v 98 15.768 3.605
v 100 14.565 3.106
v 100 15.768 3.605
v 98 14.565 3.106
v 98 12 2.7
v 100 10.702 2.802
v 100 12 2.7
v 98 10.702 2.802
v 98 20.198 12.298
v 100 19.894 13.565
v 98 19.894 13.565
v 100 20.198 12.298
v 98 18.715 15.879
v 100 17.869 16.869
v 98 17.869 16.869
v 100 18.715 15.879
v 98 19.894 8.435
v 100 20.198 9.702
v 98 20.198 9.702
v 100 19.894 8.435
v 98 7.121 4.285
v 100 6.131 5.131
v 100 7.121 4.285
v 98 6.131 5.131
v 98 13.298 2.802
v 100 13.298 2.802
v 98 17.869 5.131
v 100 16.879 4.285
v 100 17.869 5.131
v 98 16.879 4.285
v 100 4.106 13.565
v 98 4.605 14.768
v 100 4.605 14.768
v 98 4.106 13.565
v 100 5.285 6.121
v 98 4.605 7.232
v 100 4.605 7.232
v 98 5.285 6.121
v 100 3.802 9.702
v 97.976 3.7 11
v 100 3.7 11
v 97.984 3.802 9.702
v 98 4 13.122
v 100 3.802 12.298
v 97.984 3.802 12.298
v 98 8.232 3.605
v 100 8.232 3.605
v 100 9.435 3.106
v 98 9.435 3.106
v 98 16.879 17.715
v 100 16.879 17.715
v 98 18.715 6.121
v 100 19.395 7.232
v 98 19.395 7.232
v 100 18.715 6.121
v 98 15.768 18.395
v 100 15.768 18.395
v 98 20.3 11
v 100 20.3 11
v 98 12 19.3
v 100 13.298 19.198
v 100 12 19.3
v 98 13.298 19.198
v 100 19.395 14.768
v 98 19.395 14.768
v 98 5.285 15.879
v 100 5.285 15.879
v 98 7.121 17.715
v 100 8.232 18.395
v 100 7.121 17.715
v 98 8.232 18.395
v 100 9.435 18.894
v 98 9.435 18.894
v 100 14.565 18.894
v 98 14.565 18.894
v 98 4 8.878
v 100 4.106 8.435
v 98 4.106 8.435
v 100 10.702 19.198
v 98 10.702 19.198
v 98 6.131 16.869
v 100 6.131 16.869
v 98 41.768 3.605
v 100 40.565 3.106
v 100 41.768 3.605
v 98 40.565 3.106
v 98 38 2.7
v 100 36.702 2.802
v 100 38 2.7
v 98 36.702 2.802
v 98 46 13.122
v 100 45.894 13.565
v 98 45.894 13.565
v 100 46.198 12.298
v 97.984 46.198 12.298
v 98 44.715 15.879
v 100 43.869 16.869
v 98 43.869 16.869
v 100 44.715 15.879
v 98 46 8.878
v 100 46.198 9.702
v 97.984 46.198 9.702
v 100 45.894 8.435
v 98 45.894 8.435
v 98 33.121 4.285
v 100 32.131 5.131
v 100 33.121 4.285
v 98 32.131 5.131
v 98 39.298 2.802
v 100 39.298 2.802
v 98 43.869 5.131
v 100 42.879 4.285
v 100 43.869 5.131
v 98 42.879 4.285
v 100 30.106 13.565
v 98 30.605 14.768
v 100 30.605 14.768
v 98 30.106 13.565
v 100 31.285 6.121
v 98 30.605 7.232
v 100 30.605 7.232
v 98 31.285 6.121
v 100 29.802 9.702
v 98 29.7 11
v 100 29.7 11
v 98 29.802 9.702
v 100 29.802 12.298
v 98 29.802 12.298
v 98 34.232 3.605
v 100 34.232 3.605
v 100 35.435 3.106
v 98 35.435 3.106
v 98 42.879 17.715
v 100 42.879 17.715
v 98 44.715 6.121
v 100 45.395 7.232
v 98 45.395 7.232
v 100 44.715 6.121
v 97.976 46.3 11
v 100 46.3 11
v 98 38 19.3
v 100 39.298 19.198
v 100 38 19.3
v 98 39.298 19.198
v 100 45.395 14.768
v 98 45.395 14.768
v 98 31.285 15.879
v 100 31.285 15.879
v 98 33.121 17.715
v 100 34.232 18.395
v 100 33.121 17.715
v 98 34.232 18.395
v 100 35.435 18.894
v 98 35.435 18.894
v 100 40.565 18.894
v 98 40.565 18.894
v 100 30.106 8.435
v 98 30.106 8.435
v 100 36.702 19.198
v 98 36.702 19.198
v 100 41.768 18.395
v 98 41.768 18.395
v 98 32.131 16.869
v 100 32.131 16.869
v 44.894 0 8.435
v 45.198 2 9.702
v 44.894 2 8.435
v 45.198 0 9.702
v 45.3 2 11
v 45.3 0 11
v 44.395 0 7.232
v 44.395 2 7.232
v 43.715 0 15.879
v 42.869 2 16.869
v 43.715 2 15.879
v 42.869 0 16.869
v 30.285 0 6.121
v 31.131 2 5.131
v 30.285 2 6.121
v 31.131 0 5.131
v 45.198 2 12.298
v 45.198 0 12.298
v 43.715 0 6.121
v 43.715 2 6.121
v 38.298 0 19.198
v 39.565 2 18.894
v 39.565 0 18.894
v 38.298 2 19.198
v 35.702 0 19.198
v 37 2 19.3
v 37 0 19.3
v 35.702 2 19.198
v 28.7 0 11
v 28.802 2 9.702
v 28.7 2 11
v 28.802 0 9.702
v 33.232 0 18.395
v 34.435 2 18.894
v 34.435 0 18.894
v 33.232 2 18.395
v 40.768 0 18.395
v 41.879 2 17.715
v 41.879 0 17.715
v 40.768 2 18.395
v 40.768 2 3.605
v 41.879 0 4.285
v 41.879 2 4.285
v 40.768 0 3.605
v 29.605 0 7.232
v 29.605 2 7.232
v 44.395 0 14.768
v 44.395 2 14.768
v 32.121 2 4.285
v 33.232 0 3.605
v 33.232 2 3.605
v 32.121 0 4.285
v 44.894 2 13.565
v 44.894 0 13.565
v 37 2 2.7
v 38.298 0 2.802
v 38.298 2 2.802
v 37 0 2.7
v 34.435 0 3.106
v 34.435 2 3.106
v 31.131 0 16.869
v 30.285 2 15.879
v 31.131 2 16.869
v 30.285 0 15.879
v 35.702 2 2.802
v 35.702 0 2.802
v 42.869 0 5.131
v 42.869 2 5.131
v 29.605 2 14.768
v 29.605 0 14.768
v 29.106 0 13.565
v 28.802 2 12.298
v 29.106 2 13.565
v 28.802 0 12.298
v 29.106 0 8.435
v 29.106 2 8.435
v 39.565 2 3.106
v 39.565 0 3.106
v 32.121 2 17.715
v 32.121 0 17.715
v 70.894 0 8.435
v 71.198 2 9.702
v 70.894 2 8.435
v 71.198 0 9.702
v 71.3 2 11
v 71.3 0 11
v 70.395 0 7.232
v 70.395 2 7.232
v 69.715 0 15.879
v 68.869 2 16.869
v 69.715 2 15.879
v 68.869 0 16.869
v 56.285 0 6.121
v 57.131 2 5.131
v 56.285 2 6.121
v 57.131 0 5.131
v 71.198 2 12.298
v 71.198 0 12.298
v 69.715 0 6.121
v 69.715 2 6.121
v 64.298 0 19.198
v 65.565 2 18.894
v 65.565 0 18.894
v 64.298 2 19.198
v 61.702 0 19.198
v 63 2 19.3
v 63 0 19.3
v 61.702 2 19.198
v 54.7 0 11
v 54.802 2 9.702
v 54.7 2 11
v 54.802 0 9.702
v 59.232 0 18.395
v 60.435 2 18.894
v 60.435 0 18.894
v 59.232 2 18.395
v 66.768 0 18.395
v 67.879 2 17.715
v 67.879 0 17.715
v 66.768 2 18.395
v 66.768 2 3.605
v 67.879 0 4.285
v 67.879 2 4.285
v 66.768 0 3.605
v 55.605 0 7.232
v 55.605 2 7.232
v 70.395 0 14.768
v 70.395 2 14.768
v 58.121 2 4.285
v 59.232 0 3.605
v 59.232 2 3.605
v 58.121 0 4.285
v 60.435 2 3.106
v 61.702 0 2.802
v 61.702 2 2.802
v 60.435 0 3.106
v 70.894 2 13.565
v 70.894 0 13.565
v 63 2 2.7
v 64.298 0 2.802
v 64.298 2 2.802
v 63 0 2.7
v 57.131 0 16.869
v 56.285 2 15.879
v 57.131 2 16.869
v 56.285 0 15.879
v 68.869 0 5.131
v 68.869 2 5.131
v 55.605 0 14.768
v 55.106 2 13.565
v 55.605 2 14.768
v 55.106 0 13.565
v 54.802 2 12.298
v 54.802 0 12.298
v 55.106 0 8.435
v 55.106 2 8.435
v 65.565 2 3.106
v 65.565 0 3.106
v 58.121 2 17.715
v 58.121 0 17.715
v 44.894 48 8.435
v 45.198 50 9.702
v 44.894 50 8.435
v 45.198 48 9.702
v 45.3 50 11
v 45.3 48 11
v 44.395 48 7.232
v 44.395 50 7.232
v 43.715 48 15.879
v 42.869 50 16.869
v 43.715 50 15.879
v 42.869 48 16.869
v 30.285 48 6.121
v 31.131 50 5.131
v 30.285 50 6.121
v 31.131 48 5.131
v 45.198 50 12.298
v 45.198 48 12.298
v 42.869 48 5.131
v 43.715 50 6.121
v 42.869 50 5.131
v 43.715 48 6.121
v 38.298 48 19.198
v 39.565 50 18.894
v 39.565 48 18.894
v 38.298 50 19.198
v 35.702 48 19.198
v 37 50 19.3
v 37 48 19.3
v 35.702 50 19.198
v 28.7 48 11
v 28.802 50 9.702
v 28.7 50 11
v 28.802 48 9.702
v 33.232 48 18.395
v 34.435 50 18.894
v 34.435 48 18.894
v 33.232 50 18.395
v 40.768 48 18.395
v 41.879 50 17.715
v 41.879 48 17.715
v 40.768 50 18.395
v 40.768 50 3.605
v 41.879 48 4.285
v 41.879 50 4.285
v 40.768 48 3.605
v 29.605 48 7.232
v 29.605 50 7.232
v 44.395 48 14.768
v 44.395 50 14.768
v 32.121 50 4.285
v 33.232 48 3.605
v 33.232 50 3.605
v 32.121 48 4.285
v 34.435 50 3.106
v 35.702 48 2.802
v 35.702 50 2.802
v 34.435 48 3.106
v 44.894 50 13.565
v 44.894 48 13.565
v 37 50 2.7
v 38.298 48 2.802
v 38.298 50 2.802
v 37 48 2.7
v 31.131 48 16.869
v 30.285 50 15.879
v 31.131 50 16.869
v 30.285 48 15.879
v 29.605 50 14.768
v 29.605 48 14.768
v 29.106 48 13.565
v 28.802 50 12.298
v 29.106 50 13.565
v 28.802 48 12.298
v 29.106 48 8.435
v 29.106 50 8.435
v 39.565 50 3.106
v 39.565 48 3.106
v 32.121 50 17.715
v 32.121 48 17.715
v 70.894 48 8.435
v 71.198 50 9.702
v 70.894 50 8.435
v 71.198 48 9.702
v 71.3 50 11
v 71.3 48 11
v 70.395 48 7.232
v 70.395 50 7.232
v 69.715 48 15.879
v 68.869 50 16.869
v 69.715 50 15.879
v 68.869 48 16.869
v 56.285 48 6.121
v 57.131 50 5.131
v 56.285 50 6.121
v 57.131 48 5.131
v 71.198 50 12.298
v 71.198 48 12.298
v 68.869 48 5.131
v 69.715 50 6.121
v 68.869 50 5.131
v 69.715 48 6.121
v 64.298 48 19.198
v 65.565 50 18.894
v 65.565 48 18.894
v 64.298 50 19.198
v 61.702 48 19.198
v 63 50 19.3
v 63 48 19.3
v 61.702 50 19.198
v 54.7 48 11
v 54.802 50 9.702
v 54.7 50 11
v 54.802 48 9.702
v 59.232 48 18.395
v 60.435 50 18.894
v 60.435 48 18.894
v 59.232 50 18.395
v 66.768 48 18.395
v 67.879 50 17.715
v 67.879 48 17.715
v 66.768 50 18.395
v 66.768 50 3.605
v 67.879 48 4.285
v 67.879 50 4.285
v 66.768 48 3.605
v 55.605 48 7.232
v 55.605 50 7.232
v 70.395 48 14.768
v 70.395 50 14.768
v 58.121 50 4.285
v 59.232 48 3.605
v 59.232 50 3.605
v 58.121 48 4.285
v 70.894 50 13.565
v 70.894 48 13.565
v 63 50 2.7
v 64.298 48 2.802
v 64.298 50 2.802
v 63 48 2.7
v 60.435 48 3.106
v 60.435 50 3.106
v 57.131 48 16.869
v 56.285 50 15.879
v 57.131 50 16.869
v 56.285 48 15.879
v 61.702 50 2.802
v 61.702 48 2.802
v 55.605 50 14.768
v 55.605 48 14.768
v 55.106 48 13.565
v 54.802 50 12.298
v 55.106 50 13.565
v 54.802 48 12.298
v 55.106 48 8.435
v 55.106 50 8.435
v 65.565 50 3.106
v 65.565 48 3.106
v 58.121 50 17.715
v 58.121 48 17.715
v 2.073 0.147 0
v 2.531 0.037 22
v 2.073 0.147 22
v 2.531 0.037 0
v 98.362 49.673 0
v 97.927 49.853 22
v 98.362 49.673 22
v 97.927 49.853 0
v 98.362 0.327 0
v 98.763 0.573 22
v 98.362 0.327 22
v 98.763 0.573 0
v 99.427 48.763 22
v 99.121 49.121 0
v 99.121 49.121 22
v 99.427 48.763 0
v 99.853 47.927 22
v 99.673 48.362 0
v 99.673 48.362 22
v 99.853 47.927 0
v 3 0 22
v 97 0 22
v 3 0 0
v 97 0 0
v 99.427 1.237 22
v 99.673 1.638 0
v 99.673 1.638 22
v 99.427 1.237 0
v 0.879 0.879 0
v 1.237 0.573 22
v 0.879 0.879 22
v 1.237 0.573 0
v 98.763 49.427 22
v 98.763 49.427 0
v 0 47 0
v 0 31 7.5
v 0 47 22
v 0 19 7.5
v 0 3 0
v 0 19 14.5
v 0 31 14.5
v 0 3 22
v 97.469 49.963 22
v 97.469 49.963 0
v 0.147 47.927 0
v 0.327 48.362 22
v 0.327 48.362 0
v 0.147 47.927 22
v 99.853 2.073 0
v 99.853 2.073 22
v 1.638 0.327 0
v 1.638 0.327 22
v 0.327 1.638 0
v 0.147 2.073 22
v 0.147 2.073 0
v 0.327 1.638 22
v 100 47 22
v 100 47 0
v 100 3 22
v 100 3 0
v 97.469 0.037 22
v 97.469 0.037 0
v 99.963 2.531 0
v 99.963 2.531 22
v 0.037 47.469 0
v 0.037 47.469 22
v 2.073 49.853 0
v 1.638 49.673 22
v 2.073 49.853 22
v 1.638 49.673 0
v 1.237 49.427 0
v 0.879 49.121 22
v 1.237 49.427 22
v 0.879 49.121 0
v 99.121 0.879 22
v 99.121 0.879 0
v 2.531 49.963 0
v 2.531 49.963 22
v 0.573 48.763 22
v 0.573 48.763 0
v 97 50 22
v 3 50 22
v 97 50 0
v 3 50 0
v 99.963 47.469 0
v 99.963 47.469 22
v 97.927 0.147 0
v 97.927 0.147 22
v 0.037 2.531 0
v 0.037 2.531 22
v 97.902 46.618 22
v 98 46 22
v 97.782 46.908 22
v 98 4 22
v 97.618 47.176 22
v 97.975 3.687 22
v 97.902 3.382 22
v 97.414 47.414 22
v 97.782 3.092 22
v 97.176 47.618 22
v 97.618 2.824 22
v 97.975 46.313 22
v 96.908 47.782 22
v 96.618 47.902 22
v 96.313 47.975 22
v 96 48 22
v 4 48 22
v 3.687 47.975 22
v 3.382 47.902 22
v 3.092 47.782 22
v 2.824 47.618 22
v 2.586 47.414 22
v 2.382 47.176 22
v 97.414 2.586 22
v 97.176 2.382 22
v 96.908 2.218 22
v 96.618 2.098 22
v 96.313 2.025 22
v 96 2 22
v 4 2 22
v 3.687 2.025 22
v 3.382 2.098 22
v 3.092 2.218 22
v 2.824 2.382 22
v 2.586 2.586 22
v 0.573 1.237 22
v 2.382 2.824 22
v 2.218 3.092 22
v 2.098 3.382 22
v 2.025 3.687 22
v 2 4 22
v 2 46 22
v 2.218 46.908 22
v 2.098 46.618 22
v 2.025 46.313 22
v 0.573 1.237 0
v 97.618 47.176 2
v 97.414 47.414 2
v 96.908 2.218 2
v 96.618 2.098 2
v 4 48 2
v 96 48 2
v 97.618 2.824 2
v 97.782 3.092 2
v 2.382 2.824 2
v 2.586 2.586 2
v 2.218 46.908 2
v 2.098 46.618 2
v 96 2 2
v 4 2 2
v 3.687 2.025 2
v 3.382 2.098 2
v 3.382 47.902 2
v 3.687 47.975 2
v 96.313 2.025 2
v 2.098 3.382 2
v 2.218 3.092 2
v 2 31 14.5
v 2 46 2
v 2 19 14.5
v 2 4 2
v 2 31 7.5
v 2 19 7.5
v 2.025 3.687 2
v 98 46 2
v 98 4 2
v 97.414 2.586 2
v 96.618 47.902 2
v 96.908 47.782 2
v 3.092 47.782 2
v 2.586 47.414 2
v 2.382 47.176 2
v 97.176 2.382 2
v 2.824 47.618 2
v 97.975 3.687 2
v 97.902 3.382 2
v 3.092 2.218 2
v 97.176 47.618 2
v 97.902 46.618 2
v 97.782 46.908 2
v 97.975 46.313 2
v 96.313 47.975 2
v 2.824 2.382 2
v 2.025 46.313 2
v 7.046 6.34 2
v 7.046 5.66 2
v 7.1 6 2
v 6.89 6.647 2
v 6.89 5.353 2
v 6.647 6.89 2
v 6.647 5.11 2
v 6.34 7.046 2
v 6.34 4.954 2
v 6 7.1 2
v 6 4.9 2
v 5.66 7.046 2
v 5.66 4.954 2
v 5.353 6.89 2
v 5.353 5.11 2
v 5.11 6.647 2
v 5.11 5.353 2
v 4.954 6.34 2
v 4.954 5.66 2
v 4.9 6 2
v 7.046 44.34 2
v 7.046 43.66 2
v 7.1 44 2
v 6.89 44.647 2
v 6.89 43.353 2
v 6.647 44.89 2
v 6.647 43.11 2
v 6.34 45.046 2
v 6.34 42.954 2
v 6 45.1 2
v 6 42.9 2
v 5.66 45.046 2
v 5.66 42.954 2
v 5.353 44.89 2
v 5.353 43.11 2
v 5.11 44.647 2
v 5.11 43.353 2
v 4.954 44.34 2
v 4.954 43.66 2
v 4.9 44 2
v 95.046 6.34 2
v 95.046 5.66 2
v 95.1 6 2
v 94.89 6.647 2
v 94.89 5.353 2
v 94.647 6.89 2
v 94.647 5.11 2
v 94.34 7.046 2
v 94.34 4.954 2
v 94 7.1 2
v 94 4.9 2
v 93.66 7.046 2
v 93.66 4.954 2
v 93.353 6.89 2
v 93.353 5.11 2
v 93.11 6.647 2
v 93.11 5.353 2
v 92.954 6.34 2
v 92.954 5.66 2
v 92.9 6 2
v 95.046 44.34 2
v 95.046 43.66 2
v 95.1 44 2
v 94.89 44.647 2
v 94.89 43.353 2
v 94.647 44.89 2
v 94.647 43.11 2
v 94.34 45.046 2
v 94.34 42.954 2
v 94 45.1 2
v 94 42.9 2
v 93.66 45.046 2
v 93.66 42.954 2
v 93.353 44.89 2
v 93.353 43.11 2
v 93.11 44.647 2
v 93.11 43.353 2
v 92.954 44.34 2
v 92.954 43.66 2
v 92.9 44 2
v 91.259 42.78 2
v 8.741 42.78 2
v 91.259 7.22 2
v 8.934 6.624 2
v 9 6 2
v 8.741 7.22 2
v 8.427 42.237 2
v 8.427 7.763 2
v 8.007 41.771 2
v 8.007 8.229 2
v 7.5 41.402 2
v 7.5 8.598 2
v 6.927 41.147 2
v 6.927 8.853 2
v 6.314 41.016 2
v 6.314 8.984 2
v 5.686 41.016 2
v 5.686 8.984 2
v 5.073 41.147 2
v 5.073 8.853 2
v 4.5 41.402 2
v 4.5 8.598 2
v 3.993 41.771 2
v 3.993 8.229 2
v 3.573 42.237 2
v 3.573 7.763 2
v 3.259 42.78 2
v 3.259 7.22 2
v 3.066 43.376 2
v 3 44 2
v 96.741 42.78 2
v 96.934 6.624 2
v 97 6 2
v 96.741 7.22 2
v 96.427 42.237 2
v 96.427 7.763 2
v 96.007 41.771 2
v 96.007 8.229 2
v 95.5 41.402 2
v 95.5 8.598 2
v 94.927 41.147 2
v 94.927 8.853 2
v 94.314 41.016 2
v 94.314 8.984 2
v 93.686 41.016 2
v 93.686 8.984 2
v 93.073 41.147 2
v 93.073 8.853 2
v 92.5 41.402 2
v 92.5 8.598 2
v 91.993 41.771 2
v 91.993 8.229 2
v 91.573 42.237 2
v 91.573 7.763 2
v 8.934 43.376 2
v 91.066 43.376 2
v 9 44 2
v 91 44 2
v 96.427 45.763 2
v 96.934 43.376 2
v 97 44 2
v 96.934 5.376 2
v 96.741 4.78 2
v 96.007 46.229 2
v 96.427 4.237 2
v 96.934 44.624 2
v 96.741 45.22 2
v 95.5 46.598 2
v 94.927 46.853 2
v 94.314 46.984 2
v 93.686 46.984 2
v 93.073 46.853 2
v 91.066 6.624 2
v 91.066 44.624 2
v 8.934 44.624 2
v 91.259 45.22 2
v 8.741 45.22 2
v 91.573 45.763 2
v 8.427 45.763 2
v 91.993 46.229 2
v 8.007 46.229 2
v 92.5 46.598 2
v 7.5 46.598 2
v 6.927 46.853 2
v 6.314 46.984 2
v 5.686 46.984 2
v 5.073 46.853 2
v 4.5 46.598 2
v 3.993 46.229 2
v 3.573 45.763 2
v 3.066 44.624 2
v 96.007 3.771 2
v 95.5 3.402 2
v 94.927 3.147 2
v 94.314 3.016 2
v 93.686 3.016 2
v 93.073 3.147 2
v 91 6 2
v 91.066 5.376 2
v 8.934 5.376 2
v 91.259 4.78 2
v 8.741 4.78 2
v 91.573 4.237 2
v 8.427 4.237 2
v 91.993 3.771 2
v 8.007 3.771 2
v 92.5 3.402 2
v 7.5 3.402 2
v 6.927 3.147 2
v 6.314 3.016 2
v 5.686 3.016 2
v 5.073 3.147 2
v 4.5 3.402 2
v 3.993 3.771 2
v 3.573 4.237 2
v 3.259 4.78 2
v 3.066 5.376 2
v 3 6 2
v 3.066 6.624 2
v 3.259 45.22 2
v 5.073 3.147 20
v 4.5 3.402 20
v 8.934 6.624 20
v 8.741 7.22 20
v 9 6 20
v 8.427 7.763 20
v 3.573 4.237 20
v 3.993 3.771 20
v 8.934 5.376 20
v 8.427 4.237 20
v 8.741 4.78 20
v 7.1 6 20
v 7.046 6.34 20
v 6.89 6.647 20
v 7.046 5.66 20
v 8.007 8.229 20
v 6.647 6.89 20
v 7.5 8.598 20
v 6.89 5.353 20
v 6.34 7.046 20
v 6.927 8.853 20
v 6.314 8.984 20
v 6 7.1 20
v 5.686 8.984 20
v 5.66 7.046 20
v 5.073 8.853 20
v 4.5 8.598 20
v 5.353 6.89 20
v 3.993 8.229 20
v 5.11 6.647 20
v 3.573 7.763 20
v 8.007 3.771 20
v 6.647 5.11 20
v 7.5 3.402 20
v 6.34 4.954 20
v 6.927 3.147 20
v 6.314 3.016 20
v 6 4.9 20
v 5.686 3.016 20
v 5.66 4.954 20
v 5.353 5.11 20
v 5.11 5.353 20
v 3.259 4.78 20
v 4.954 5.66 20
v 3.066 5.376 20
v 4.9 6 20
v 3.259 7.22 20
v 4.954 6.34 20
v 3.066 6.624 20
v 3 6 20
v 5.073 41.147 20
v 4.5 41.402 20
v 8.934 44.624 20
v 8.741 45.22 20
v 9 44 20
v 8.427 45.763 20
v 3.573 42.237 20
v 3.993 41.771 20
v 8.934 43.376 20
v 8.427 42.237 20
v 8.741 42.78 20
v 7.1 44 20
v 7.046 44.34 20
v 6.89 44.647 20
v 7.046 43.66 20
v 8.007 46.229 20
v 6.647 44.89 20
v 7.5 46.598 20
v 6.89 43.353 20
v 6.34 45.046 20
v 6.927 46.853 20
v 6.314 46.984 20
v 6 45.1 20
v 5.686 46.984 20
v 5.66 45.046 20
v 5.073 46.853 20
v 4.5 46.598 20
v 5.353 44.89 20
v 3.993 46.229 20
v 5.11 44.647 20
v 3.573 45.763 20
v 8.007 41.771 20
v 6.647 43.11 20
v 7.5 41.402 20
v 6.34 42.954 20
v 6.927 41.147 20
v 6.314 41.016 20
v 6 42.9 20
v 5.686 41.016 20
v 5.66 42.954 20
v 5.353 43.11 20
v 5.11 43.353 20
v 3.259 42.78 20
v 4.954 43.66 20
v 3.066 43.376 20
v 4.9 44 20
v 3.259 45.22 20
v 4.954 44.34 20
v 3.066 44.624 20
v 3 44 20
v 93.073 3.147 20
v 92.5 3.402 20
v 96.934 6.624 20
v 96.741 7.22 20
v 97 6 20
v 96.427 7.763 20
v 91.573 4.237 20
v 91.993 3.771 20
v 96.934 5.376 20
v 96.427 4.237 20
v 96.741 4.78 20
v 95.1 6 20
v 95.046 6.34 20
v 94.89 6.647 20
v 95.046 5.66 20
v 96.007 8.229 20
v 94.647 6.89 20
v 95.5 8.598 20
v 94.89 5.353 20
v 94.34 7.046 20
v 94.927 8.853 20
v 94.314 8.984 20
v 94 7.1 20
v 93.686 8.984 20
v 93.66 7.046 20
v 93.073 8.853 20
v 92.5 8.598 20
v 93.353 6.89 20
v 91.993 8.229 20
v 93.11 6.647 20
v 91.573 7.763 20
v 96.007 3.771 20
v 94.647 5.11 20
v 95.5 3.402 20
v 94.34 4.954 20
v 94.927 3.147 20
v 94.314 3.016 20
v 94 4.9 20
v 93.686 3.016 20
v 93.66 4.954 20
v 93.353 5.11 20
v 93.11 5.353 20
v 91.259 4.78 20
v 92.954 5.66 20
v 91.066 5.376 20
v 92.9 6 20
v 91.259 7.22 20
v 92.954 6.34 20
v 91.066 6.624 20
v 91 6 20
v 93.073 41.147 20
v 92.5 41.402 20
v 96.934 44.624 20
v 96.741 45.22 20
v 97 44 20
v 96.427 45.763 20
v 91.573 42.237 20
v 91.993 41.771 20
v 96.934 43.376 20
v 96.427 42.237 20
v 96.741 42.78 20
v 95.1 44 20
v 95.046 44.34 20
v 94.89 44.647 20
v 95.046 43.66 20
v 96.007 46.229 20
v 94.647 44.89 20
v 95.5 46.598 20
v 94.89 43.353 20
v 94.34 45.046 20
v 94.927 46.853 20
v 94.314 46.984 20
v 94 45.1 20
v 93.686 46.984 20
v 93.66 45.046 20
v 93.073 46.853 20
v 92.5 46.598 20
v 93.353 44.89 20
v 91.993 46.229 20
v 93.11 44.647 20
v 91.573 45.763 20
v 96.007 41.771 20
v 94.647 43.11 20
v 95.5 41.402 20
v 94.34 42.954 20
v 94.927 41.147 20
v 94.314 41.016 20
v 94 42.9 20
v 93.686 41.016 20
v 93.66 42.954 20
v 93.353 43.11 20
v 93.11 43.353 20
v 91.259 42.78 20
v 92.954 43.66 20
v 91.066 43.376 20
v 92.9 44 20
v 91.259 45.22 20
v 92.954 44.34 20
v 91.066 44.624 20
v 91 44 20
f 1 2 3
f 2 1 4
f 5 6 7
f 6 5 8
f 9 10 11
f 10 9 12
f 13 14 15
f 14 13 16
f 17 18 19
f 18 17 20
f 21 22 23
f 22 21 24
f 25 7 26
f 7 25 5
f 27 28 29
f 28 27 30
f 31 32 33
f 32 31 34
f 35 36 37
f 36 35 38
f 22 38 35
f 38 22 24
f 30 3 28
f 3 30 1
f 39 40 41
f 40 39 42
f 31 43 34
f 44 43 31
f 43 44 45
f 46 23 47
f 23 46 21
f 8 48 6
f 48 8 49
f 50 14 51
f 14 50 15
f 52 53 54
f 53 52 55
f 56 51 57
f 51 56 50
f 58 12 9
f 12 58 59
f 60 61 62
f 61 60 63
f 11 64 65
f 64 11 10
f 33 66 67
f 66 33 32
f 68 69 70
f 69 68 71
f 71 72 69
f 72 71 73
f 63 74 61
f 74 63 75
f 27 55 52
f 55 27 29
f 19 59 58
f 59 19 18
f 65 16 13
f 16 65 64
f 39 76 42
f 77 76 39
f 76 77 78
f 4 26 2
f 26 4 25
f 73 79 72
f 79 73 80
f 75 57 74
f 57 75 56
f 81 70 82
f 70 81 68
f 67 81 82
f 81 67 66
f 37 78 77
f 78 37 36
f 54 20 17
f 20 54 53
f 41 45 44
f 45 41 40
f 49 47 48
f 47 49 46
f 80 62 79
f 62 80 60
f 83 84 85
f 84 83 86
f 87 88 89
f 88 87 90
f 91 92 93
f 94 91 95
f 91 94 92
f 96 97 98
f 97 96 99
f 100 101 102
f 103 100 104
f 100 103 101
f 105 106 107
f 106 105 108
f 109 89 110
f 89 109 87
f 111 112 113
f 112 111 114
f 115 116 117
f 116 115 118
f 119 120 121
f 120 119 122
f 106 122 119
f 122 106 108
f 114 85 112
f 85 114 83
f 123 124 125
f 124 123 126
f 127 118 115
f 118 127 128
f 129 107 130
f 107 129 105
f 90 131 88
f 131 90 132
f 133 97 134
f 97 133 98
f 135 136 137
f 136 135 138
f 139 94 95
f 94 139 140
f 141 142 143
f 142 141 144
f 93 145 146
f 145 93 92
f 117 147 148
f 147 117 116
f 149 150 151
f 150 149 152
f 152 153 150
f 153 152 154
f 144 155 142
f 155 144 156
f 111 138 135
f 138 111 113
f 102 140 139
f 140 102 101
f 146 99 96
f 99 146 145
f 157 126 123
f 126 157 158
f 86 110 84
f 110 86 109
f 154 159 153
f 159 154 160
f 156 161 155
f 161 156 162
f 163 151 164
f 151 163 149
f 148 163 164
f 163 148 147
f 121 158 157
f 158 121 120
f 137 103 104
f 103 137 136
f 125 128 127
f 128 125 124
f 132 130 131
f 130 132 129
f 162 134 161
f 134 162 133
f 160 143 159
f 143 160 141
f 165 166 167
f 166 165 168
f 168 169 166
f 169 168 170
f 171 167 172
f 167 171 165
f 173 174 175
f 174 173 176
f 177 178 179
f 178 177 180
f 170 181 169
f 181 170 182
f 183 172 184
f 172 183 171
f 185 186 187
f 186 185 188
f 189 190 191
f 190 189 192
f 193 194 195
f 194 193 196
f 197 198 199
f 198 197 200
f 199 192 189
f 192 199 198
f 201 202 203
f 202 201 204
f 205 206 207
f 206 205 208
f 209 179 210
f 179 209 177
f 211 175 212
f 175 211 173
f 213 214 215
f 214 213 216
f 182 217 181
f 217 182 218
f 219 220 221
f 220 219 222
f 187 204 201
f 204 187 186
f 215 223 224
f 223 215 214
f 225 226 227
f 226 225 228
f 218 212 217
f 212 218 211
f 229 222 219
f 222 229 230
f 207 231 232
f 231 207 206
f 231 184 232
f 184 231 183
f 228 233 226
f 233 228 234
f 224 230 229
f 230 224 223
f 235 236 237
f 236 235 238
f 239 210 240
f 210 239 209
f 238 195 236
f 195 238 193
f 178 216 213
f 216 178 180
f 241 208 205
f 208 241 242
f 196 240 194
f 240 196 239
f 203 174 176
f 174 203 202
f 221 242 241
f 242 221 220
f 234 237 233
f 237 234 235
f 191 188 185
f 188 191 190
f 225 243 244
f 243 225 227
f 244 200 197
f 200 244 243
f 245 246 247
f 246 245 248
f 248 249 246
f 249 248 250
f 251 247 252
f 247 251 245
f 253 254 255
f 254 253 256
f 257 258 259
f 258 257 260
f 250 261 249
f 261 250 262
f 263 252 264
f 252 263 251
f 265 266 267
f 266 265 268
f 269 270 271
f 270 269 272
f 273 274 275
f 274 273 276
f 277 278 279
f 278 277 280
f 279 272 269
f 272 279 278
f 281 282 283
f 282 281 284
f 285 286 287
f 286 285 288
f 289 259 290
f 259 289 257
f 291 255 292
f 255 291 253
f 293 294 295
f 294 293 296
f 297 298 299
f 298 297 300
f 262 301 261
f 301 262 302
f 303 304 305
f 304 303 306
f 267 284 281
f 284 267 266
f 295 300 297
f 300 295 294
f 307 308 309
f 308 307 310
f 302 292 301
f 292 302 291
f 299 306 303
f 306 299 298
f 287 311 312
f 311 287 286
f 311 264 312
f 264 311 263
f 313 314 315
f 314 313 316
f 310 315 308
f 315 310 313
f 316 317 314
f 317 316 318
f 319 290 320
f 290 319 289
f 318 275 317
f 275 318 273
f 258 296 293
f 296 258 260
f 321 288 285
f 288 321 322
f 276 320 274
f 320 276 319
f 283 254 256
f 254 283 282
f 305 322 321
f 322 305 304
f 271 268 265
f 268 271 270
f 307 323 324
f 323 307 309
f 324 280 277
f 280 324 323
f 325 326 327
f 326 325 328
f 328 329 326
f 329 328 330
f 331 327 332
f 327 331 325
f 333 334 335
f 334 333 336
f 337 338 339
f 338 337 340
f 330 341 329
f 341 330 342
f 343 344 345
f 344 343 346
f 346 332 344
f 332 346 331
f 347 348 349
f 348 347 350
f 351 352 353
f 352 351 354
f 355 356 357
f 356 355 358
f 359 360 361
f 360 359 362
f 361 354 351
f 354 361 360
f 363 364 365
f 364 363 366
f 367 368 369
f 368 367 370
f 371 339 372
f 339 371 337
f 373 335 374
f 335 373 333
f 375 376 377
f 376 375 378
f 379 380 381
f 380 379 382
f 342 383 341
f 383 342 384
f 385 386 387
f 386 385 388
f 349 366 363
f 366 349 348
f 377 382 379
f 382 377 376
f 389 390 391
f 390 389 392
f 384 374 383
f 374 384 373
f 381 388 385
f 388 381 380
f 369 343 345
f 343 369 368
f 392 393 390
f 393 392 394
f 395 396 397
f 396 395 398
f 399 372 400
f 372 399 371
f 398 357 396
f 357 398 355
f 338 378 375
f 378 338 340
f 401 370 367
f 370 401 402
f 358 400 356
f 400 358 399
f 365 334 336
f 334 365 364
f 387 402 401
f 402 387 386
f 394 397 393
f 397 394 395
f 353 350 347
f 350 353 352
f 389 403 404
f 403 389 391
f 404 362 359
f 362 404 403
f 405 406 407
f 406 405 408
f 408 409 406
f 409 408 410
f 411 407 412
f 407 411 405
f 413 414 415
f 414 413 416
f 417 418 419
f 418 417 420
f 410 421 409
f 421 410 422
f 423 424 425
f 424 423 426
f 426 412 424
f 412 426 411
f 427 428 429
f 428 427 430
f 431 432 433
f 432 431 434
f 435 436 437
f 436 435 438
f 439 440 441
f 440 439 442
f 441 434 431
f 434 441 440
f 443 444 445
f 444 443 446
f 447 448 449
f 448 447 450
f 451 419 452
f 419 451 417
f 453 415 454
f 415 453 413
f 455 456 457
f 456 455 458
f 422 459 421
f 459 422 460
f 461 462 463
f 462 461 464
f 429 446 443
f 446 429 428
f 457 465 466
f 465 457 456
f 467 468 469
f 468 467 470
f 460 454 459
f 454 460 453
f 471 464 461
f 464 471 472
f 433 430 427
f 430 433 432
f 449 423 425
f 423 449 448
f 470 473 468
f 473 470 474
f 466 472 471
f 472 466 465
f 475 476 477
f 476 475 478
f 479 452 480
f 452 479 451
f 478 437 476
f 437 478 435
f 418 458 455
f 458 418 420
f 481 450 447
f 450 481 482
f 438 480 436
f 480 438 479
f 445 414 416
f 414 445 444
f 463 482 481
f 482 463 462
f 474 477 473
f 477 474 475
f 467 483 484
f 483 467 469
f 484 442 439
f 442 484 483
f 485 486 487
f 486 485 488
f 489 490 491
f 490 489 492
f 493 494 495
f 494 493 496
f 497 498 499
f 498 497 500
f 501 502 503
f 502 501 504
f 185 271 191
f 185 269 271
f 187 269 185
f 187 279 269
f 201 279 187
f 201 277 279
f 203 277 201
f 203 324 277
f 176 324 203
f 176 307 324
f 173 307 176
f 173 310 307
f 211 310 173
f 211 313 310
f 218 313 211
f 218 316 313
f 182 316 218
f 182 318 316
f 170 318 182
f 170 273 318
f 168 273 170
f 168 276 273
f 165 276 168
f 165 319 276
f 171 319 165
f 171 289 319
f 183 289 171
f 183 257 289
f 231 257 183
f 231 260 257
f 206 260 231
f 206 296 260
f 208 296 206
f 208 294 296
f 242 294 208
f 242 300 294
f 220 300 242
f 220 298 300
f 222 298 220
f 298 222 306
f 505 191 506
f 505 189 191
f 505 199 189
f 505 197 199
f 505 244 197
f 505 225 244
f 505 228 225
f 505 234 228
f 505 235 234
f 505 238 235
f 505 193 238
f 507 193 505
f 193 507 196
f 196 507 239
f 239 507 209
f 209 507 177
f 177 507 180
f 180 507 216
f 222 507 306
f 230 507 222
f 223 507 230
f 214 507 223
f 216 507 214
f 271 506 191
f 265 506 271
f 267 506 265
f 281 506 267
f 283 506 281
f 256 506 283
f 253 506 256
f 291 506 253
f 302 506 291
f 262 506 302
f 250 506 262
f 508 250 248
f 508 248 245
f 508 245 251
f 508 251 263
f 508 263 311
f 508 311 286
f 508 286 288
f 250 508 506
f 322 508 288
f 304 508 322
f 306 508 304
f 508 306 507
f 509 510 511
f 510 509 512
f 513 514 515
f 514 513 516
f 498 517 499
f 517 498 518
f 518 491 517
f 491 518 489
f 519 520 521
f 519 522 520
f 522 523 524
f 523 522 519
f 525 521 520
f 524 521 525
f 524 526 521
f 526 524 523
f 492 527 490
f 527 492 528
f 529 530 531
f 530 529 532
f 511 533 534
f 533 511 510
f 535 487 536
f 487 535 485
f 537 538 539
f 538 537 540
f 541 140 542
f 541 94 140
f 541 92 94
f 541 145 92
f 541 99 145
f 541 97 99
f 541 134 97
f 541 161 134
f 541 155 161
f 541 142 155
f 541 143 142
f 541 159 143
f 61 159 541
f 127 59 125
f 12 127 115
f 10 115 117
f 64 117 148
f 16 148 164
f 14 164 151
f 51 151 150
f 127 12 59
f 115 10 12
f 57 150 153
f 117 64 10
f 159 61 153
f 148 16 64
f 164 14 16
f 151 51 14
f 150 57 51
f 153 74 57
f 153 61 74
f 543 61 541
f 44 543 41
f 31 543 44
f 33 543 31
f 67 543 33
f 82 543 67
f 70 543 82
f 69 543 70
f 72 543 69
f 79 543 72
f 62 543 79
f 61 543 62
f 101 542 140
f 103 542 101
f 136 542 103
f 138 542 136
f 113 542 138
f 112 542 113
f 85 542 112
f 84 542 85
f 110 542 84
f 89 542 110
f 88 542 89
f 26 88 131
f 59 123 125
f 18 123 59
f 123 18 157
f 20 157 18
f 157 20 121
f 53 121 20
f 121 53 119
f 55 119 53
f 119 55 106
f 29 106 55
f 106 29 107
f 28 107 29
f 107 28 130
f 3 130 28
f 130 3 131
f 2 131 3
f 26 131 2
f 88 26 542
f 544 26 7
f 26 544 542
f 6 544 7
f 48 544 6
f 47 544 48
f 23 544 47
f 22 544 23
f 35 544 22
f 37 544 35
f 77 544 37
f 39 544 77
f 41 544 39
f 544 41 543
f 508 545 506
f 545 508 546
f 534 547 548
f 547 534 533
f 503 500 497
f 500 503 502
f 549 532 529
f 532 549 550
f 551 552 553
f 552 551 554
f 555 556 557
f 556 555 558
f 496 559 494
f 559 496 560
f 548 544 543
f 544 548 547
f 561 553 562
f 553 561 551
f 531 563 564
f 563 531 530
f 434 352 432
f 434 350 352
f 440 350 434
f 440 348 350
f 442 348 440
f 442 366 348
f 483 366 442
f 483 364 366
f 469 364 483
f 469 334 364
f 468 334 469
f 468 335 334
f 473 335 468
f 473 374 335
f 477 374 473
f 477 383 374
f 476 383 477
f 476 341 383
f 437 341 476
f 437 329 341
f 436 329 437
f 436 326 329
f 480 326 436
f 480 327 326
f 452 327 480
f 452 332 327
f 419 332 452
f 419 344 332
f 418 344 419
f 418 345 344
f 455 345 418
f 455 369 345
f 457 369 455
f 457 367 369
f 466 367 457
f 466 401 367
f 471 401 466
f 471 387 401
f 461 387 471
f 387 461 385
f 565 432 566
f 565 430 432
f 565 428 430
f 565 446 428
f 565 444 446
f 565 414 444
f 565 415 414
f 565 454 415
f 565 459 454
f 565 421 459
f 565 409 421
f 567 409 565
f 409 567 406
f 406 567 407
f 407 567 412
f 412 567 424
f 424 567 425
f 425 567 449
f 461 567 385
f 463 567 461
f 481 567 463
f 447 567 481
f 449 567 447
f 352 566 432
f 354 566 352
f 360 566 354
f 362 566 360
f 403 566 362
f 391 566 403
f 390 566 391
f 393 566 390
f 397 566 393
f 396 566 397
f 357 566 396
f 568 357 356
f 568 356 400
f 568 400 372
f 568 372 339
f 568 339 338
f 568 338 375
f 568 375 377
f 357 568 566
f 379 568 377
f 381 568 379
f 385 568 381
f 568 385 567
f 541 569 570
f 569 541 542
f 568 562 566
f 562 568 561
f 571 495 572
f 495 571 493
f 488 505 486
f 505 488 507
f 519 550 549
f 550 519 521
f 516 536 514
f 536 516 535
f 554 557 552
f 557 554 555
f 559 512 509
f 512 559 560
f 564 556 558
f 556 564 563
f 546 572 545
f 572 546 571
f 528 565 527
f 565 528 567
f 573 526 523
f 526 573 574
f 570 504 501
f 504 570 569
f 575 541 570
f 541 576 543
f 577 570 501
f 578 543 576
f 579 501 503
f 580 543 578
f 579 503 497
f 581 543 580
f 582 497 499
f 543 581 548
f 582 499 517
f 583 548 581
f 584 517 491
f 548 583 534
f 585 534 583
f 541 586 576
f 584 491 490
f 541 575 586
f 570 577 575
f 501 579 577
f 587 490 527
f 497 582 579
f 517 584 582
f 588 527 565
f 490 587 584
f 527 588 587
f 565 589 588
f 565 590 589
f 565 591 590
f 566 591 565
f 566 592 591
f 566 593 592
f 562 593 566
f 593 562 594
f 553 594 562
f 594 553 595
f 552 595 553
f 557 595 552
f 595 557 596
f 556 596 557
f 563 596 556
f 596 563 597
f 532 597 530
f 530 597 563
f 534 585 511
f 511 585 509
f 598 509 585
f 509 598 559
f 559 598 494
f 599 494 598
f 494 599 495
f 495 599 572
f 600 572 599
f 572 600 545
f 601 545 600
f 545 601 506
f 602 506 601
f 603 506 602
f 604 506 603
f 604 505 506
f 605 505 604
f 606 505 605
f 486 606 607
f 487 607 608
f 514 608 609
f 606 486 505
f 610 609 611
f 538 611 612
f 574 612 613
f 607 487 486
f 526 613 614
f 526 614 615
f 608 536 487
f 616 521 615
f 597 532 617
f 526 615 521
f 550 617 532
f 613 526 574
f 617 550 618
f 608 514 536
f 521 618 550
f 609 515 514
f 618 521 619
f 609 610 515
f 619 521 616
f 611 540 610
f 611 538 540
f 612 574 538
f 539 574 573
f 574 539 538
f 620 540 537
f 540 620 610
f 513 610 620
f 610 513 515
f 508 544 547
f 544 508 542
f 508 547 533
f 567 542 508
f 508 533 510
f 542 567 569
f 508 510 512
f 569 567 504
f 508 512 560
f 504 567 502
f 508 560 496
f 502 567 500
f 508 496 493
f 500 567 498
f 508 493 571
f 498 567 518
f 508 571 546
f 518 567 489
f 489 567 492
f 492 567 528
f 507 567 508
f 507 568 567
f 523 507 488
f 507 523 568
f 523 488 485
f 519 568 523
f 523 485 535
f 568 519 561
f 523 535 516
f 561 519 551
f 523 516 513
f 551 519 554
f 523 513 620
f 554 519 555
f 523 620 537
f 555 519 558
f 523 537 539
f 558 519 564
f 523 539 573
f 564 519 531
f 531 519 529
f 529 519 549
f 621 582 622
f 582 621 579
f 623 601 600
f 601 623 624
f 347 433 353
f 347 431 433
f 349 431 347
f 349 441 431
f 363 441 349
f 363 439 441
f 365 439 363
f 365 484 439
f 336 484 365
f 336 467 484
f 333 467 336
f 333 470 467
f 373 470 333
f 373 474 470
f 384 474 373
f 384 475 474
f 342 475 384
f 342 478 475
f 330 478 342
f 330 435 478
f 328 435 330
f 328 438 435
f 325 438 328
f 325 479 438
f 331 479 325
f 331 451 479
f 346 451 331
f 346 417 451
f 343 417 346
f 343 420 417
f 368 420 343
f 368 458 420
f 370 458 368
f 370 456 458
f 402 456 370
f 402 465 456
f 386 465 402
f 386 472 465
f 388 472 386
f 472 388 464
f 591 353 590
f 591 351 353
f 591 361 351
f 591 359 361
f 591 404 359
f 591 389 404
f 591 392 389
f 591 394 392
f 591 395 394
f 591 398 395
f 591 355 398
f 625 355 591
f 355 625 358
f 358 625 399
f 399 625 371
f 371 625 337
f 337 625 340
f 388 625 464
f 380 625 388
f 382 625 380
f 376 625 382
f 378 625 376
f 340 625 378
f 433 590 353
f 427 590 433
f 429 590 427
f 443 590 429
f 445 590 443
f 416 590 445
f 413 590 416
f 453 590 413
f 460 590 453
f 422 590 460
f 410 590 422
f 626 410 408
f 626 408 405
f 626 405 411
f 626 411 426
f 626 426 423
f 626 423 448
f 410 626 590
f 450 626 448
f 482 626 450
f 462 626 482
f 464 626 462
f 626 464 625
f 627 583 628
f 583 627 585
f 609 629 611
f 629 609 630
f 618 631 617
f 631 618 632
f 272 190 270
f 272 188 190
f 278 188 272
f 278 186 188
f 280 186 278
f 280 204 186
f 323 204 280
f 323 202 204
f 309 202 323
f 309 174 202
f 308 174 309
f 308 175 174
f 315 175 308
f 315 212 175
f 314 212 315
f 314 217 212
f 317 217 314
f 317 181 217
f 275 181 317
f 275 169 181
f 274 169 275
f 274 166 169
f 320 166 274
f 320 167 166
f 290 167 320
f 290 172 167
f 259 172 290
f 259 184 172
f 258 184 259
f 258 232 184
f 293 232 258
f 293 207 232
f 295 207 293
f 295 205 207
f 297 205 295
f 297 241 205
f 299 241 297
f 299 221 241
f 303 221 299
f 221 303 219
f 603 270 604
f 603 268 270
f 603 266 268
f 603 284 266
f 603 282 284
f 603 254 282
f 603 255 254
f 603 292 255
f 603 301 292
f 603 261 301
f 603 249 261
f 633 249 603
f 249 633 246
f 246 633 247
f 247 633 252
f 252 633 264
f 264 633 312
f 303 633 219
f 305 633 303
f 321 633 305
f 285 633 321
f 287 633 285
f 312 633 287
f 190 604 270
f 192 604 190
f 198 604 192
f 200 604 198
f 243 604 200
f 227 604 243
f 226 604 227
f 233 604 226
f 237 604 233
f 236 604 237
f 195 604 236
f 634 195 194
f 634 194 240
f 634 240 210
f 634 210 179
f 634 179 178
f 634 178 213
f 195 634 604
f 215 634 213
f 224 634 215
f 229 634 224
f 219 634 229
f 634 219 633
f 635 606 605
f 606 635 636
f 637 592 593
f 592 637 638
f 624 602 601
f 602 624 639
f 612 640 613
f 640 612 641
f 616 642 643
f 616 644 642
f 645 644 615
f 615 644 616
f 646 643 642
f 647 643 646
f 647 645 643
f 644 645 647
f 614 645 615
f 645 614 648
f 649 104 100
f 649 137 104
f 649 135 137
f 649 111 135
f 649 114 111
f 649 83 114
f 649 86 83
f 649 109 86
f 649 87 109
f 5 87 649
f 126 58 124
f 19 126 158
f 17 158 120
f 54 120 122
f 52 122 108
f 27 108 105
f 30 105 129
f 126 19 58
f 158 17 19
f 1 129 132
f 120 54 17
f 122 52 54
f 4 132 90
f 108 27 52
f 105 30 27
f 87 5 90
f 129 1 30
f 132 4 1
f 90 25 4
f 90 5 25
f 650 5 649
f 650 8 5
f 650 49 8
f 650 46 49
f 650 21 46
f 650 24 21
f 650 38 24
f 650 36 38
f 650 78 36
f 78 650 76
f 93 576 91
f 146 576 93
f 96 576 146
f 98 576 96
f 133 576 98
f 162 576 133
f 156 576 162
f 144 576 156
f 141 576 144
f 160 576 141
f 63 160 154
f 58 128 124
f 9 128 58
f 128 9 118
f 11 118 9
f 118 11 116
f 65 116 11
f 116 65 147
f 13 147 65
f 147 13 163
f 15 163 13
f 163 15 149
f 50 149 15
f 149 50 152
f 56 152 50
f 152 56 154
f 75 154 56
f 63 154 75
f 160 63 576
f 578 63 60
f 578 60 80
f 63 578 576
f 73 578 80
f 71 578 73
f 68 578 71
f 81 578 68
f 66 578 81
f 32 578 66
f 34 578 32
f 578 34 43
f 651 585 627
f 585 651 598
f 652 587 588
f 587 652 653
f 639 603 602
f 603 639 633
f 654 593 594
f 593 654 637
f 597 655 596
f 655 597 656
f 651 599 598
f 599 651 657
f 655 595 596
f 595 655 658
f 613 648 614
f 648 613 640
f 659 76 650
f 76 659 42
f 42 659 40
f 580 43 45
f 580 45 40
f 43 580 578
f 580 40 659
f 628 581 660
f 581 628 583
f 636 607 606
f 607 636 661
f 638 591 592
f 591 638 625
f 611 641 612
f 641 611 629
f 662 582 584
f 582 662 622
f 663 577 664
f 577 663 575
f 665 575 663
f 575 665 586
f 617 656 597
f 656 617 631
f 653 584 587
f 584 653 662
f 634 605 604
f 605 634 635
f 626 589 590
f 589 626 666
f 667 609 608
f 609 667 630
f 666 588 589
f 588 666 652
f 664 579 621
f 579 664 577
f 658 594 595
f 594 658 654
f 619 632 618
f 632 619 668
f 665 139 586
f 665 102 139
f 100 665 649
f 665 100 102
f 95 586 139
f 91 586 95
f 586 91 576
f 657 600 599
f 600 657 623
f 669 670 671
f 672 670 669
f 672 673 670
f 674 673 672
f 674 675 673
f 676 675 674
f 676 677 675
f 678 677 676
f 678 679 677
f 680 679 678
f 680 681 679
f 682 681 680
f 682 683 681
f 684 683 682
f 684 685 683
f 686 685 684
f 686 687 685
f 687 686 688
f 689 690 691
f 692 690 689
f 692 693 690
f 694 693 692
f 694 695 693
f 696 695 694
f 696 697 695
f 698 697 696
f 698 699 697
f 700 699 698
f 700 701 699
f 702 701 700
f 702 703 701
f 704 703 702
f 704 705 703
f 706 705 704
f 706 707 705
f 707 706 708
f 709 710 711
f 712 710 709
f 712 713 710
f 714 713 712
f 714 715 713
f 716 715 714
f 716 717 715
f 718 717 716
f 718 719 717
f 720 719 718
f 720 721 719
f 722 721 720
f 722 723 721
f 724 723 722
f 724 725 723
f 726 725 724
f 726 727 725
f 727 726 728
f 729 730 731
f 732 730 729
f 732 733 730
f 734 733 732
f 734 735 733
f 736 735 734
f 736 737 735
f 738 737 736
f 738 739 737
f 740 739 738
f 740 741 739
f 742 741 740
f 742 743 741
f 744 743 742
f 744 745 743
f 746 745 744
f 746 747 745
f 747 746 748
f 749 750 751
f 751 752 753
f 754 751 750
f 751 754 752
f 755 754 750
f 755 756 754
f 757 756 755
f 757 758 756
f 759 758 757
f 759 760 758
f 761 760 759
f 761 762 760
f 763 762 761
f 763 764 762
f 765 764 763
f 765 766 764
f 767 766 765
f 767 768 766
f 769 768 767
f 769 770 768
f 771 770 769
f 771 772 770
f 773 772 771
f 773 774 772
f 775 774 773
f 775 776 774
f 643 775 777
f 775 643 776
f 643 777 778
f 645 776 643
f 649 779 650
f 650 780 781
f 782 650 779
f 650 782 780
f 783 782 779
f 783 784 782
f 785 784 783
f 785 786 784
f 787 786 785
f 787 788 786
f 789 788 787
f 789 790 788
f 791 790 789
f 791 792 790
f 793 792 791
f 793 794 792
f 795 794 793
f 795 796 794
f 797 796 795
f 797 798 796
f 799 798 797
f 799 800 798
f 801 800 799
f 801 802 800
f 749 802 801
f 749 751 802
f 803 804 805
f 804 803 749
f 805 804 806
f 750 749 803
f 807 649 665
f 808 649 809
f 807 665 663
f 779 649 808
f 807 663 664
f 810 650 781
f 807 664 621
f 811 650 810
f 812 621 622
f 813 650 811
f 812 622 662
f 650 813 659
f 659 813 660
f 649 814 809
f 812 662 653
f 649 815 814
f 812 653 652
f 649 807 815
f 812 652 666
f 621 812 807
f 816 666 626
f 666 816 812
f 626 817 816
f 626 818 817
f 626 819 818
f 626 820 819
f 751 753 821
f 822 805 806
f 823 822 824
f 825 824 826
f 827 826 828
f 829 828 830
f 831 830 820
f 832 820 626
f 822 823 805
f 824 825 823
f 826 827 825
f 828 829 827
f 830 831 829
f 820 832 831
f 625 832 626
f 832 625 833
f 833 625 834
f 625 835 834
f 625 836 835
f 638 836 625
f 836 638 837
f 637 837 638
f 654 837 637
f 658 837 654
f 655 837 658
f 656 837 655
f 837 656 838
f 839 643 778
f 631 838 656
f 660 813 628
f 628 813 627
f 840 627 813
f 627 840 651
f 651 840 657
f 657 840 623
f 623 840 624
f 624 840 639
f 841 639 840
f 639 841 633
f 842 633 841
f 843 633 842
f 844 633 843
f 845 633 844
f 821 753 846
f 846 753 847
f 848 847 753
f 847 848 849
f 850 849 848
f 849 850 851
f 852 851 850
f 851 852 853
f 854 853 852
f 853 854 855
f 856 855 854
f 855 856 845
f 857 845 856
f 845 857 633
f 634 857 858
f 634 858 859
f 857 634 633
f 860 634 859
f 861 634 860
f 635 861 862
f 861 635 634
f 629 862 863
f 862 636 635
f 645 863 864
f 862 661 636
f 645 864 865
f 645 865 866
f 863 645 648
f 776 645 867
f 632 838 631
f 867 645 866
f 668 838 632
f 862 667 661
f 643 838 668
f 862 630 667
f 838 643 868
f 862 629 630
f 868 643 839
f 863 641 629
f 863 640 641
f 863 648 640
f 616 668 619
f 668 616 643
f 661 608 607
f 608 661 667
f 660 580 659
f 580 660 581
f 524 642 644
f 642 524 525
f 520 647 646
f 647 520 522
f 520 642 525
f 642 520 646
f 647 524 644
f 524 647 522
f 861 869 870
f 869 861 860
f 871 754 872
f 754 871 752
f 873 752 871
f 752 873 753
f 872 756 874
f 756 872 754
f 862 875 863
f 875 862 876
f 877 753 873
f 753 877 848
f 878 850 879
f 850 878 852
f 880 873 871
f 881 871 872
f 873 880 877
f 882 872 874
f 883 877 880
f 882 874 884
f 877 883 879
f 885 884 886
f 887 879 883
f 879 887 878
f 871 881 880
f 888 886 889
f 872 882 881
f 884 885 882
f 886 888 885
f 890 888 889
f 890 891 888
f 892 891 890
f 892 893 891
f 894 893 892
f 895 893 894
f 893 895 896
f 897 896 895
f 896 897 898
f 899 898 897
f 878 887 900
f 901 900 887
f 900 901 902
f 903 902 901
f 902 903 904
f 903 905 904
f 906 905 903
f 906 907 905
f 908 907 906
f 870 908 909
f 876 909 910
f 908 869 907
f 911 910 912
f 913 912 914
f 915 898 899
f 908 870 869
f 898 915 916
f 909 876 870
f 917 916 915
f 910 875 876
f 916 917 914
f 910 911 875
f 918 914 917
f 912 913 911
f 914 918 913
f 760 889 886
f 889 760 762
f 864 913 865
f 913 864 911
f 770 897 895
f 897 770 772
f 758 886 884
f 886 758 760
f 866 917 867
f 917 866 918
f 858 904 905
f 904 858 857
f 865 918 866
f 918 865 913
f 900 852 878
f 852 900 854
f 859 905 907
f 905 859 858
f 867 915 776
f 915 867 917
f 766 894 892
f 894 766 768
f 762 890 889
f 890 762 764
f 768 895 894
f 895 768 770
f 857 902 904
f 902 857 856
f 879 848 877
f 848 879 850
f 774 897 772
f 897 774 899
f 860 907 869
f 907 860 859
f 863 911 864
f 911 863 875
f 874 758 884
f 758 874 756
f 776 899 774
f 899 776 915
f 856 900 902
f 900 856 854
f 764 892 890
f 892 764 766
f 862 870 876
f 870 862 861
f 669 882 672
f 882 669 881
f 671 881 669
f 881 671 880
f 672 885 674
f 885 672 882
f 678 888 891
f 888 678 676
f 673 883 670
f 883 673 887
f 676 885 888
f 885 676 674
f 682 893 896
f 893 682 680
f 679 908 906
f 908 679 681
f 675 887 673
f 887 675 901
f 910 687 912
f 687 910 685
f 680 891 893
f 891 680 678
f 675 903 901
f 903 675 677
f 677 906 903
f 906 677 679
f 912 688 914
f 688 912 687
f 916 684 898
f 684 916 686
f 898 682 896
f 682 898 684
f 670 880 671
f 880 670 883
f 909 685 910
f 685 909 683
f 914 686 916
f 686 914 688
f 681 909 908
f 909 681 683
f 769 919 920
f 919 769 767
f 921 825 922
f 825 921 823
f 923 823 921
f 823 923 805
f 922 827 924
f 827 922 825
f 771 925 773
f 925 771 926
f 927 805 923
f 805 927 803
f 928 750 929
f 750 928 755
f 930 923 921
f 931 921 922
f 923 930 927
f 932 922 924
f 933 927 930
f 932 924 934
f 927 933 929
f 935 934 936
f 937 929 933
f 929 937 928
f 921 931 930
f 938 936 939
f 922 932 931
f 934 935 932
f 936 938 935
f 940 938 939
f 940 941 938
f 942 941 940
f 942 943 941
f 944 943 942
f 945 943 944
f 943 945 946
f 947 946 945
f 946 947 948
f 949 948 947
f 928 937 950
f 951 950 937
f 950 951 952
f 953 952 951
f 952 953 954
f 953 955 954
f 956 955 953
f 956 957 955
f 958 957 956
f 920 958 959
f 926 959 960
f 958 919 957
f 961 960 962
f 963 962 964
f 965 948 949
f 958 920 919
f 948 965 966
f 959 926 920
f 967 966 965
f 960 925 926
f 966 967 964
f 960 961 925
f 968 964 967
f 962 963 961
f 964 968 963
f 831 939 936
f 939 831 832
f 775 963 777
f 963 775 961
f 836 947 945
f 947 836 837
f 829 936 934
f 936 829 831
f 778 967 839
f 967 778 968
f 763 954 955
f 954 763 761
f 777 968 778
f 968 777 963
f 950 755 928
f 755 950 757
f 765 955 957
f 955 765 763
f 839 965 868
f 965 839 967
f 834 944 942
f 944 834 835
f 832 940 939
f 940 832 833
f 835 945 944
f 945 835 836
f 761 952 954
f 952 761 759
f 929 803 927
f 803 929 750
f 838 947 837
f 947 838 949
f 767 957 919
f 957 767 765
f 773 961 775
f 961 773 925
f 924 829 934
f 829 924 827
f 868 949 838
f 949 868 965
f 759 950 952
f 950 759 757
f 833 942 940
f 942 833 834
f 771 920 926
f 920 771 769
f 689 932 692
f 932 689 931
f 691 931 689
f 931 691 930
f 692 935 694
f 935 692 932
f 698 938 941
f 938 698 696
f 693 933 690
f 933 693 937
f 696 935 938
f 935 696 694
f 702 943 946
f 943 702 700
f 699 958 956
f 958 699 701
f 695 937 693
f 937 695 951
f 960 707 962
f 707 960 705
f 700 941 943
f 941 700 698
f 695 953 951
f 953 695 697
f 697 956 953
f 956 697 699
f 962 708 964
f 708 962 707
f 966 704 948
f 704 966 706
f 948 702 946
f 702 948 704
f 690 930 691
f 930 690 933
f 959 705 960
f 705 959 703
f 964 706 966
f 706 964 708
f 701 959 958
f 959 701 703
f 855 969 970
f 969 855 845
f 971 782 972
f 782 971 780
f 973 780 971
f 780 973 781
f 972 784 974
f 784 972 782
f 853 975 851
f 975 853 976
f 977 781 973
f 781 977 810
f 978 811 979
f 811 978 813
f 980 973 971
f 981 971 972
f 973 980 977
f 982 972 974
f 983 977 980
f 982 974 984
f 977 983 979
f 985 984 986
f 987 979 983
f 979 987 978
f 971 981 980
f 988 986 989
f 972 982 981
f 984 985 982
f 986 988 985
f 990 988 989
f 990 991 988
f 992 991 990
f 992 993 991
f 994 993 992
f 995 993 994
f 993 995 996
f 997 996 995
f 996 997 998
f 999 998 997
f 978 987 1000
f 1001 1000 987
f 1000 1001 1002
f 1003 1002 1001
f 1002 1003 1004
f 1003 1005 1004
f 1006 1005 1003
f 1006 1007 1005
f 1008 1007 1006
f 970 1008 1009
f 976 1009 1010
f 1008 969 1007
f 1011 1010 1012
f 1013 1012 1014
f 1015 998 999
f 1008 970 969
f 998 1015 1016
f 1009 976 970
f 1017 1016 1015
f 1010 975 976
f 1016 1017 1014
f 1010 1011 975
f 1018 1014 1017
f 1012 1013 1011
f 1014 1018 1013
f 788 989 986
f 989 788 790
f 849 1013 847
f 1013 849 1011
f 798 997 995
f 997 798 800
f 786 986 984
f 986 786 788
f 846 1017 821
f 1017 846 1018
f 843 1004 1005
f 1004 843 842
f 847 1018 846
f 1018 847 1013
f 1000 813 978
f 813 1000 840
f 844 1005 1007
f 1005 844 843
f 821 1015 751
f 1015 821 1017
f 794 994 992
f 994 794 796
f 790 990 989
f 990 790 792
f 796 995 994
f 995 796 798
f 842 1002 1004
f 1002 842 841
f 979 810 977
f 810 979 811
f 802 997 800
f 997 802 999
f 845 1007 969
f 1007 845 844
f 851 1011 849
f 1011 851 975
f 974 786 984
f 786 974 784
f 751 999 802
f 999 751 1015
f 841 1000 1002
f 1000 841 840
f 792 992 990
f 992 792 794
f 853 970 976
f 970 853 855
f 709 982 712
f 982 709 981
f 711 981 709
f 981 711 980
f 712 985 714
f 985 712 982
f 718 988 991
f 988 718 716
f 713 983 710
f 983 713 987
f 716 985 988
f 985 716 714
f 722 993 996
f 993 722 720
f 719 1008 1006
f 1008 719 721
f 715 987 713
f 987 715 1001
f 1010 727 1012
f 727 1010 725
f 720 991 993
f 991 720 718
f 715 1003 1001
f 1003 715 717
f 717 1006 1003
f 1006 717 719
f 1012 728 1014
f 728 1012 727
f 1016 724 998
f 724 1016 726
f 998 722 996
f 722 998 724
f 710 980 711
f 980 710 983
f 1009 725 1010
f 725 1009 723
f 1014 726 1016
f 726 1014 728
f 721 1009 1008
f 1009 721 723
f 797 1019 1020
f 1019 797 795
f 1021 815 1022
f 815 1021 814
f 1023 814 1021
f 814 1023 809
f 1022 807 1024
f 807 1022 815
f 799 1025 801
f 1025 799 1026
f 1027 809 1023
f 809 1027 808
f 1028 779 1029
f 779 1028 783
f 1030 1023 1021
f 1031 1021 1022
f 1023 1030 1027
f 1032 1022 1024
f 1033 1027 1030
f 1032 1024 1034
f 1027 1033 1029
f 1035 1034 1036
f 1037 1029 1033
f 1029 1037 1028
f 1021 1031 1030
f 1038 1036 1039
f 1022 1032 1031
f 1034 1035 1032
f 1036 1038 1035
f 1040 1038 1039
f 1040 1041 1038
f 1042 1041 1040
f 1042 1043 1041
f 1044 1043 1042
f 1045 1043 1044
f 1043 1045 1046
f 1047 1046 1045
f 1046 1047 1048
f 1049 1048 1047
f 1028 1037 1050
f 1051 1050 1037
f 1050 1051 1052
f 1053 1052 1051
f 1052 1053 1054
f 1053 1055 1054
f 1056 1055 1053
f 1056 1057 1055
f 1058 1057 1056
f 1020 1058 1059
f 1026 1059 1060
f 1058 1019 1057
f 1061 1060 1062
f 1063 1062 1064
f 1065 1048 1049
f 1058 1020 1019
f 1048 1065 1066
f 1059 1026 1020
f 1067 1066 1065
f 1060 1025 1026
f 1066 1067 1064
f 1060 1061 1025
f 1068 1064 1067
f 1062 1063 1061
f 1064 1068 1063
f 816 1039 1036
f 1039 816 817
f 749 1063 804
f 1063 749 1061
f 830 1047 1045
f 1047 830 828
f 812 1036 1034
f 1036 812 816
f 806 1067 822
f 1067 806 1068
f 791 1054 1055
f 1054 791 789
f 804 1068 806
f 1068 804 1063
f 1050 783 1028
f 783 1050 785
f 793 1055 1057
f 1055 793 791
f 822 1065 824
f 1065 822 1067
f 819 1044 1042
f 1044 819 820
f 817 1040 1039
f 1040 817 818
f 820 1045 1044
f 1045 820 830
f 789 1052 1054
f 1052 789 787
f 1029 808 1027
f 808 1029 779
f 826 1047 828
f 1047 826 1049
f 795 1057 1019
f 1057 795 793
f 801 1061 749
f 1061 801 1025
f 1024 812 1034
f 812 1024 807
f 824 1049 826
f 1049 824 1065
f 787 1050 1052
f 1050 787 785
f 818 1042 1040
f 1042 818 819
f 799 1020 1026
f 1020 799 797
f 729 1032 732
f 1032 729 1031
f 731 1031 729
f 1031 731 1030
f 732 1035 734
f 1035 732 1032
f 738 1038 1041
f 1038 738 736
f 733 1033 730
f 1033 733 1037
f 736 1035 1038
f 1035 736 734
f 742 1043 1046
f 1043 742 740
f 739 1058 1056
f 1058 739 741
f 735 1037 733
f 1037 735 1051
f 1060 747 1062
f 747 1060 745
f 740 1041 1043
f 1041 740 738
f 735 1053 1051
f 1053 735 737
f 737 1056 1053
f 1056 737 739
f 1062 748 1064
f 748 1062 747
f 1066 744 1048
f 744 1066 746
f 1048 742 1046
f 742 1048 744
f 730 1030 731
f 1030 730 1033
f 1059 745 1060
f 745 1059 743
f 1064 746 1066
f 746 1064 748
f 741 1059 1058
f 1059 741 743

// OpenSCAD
// Wrist/armband enclosure v1: navigation wearable
// Export: OpenSCAD -> Design > Render (F6) -> File > Export > STL
// Render base and lid separately by changing PART.
PART   = "base";      // "base" or "lid"

// --- Outer size (mm). See hardware/README.md for why not 90x40x15 ---
L = 100; W = 50; H = 22; wall = 2; r = 3;

// --- HC-SR04 transducers: 16 mm dia, 26 mm centre spacing ---
tx_d = 16.6; tx_pitch = 26;
btn_d = 12.2;         // 12 mm pushbutton
usb_w = 12; usb_h = 7;

module rbox(l,w,h,rad){ hull() for(x=[rad,l-rad]) for(y=[rad,w-rad]) translate([x,y,0]) cylinder(r=rad,h=h,$fn=40); }

module base(){
  difference(){
    rbox(L,W,H,r);
    translate([wall,wall,wall]) rbox(L-2*wall,W-2*wall,H,r-1);            // cavity
    // FRONT sensor: on the +X end face (toward the fingers)
    for(s=[-1,1]) translate([L-wall-1, W/2+s*tx_pitch/2, H/2]) rotate([0,90,0]) cylinder(d=tx_d,h=wall+2,$fn=40);
    // LEFT sensor: on the -Y long face
    for(s=[-1,1]) translate([L/2+s*tx_pitch/2, -1, H/2]) rotate([-90,0,0]) cylinder(d=tx_d,h=wall+2,$fn=40);
    // RIGHT sensor: on the +Y long face
    for(s=[-1,1]) translate([L/2+s*tx_pitch/2, W-wall-1, H/2]) rotate([-90,0,0]) cylinder(d=tx_d,h=wall+2,$fn=40);
    // USB access on the -X end face
    translate([-1, W/2-usb_w/2, H/2-usb_h/2]) cube([wall+2,usb_w,usb_h]);
  }
  // screw posts for the lid
  for(x=[6,L-6]) for(y=[6,W-6]) translate([x,y,wall]) difference(){ cylinder(d=6,h=H-wall-2,$fn=30); cylinder(d=2.2,h=H,$fn=20); }
}

module lid(){
  difference(){
    rbox(L,W,wall,r);
    translate([L/2,W/2,-1]) cylinder(d=btn_d,h=wall+2,$fn=40);              // mode button
    for(x=[6,L-6]) for(y=[6,W-6]) translate([x,y,-1]) cylinder(d=3.2,h=wall+2,$fn=20); // M2 screws
  }
}

if (PART=="base") base(); else lid();
